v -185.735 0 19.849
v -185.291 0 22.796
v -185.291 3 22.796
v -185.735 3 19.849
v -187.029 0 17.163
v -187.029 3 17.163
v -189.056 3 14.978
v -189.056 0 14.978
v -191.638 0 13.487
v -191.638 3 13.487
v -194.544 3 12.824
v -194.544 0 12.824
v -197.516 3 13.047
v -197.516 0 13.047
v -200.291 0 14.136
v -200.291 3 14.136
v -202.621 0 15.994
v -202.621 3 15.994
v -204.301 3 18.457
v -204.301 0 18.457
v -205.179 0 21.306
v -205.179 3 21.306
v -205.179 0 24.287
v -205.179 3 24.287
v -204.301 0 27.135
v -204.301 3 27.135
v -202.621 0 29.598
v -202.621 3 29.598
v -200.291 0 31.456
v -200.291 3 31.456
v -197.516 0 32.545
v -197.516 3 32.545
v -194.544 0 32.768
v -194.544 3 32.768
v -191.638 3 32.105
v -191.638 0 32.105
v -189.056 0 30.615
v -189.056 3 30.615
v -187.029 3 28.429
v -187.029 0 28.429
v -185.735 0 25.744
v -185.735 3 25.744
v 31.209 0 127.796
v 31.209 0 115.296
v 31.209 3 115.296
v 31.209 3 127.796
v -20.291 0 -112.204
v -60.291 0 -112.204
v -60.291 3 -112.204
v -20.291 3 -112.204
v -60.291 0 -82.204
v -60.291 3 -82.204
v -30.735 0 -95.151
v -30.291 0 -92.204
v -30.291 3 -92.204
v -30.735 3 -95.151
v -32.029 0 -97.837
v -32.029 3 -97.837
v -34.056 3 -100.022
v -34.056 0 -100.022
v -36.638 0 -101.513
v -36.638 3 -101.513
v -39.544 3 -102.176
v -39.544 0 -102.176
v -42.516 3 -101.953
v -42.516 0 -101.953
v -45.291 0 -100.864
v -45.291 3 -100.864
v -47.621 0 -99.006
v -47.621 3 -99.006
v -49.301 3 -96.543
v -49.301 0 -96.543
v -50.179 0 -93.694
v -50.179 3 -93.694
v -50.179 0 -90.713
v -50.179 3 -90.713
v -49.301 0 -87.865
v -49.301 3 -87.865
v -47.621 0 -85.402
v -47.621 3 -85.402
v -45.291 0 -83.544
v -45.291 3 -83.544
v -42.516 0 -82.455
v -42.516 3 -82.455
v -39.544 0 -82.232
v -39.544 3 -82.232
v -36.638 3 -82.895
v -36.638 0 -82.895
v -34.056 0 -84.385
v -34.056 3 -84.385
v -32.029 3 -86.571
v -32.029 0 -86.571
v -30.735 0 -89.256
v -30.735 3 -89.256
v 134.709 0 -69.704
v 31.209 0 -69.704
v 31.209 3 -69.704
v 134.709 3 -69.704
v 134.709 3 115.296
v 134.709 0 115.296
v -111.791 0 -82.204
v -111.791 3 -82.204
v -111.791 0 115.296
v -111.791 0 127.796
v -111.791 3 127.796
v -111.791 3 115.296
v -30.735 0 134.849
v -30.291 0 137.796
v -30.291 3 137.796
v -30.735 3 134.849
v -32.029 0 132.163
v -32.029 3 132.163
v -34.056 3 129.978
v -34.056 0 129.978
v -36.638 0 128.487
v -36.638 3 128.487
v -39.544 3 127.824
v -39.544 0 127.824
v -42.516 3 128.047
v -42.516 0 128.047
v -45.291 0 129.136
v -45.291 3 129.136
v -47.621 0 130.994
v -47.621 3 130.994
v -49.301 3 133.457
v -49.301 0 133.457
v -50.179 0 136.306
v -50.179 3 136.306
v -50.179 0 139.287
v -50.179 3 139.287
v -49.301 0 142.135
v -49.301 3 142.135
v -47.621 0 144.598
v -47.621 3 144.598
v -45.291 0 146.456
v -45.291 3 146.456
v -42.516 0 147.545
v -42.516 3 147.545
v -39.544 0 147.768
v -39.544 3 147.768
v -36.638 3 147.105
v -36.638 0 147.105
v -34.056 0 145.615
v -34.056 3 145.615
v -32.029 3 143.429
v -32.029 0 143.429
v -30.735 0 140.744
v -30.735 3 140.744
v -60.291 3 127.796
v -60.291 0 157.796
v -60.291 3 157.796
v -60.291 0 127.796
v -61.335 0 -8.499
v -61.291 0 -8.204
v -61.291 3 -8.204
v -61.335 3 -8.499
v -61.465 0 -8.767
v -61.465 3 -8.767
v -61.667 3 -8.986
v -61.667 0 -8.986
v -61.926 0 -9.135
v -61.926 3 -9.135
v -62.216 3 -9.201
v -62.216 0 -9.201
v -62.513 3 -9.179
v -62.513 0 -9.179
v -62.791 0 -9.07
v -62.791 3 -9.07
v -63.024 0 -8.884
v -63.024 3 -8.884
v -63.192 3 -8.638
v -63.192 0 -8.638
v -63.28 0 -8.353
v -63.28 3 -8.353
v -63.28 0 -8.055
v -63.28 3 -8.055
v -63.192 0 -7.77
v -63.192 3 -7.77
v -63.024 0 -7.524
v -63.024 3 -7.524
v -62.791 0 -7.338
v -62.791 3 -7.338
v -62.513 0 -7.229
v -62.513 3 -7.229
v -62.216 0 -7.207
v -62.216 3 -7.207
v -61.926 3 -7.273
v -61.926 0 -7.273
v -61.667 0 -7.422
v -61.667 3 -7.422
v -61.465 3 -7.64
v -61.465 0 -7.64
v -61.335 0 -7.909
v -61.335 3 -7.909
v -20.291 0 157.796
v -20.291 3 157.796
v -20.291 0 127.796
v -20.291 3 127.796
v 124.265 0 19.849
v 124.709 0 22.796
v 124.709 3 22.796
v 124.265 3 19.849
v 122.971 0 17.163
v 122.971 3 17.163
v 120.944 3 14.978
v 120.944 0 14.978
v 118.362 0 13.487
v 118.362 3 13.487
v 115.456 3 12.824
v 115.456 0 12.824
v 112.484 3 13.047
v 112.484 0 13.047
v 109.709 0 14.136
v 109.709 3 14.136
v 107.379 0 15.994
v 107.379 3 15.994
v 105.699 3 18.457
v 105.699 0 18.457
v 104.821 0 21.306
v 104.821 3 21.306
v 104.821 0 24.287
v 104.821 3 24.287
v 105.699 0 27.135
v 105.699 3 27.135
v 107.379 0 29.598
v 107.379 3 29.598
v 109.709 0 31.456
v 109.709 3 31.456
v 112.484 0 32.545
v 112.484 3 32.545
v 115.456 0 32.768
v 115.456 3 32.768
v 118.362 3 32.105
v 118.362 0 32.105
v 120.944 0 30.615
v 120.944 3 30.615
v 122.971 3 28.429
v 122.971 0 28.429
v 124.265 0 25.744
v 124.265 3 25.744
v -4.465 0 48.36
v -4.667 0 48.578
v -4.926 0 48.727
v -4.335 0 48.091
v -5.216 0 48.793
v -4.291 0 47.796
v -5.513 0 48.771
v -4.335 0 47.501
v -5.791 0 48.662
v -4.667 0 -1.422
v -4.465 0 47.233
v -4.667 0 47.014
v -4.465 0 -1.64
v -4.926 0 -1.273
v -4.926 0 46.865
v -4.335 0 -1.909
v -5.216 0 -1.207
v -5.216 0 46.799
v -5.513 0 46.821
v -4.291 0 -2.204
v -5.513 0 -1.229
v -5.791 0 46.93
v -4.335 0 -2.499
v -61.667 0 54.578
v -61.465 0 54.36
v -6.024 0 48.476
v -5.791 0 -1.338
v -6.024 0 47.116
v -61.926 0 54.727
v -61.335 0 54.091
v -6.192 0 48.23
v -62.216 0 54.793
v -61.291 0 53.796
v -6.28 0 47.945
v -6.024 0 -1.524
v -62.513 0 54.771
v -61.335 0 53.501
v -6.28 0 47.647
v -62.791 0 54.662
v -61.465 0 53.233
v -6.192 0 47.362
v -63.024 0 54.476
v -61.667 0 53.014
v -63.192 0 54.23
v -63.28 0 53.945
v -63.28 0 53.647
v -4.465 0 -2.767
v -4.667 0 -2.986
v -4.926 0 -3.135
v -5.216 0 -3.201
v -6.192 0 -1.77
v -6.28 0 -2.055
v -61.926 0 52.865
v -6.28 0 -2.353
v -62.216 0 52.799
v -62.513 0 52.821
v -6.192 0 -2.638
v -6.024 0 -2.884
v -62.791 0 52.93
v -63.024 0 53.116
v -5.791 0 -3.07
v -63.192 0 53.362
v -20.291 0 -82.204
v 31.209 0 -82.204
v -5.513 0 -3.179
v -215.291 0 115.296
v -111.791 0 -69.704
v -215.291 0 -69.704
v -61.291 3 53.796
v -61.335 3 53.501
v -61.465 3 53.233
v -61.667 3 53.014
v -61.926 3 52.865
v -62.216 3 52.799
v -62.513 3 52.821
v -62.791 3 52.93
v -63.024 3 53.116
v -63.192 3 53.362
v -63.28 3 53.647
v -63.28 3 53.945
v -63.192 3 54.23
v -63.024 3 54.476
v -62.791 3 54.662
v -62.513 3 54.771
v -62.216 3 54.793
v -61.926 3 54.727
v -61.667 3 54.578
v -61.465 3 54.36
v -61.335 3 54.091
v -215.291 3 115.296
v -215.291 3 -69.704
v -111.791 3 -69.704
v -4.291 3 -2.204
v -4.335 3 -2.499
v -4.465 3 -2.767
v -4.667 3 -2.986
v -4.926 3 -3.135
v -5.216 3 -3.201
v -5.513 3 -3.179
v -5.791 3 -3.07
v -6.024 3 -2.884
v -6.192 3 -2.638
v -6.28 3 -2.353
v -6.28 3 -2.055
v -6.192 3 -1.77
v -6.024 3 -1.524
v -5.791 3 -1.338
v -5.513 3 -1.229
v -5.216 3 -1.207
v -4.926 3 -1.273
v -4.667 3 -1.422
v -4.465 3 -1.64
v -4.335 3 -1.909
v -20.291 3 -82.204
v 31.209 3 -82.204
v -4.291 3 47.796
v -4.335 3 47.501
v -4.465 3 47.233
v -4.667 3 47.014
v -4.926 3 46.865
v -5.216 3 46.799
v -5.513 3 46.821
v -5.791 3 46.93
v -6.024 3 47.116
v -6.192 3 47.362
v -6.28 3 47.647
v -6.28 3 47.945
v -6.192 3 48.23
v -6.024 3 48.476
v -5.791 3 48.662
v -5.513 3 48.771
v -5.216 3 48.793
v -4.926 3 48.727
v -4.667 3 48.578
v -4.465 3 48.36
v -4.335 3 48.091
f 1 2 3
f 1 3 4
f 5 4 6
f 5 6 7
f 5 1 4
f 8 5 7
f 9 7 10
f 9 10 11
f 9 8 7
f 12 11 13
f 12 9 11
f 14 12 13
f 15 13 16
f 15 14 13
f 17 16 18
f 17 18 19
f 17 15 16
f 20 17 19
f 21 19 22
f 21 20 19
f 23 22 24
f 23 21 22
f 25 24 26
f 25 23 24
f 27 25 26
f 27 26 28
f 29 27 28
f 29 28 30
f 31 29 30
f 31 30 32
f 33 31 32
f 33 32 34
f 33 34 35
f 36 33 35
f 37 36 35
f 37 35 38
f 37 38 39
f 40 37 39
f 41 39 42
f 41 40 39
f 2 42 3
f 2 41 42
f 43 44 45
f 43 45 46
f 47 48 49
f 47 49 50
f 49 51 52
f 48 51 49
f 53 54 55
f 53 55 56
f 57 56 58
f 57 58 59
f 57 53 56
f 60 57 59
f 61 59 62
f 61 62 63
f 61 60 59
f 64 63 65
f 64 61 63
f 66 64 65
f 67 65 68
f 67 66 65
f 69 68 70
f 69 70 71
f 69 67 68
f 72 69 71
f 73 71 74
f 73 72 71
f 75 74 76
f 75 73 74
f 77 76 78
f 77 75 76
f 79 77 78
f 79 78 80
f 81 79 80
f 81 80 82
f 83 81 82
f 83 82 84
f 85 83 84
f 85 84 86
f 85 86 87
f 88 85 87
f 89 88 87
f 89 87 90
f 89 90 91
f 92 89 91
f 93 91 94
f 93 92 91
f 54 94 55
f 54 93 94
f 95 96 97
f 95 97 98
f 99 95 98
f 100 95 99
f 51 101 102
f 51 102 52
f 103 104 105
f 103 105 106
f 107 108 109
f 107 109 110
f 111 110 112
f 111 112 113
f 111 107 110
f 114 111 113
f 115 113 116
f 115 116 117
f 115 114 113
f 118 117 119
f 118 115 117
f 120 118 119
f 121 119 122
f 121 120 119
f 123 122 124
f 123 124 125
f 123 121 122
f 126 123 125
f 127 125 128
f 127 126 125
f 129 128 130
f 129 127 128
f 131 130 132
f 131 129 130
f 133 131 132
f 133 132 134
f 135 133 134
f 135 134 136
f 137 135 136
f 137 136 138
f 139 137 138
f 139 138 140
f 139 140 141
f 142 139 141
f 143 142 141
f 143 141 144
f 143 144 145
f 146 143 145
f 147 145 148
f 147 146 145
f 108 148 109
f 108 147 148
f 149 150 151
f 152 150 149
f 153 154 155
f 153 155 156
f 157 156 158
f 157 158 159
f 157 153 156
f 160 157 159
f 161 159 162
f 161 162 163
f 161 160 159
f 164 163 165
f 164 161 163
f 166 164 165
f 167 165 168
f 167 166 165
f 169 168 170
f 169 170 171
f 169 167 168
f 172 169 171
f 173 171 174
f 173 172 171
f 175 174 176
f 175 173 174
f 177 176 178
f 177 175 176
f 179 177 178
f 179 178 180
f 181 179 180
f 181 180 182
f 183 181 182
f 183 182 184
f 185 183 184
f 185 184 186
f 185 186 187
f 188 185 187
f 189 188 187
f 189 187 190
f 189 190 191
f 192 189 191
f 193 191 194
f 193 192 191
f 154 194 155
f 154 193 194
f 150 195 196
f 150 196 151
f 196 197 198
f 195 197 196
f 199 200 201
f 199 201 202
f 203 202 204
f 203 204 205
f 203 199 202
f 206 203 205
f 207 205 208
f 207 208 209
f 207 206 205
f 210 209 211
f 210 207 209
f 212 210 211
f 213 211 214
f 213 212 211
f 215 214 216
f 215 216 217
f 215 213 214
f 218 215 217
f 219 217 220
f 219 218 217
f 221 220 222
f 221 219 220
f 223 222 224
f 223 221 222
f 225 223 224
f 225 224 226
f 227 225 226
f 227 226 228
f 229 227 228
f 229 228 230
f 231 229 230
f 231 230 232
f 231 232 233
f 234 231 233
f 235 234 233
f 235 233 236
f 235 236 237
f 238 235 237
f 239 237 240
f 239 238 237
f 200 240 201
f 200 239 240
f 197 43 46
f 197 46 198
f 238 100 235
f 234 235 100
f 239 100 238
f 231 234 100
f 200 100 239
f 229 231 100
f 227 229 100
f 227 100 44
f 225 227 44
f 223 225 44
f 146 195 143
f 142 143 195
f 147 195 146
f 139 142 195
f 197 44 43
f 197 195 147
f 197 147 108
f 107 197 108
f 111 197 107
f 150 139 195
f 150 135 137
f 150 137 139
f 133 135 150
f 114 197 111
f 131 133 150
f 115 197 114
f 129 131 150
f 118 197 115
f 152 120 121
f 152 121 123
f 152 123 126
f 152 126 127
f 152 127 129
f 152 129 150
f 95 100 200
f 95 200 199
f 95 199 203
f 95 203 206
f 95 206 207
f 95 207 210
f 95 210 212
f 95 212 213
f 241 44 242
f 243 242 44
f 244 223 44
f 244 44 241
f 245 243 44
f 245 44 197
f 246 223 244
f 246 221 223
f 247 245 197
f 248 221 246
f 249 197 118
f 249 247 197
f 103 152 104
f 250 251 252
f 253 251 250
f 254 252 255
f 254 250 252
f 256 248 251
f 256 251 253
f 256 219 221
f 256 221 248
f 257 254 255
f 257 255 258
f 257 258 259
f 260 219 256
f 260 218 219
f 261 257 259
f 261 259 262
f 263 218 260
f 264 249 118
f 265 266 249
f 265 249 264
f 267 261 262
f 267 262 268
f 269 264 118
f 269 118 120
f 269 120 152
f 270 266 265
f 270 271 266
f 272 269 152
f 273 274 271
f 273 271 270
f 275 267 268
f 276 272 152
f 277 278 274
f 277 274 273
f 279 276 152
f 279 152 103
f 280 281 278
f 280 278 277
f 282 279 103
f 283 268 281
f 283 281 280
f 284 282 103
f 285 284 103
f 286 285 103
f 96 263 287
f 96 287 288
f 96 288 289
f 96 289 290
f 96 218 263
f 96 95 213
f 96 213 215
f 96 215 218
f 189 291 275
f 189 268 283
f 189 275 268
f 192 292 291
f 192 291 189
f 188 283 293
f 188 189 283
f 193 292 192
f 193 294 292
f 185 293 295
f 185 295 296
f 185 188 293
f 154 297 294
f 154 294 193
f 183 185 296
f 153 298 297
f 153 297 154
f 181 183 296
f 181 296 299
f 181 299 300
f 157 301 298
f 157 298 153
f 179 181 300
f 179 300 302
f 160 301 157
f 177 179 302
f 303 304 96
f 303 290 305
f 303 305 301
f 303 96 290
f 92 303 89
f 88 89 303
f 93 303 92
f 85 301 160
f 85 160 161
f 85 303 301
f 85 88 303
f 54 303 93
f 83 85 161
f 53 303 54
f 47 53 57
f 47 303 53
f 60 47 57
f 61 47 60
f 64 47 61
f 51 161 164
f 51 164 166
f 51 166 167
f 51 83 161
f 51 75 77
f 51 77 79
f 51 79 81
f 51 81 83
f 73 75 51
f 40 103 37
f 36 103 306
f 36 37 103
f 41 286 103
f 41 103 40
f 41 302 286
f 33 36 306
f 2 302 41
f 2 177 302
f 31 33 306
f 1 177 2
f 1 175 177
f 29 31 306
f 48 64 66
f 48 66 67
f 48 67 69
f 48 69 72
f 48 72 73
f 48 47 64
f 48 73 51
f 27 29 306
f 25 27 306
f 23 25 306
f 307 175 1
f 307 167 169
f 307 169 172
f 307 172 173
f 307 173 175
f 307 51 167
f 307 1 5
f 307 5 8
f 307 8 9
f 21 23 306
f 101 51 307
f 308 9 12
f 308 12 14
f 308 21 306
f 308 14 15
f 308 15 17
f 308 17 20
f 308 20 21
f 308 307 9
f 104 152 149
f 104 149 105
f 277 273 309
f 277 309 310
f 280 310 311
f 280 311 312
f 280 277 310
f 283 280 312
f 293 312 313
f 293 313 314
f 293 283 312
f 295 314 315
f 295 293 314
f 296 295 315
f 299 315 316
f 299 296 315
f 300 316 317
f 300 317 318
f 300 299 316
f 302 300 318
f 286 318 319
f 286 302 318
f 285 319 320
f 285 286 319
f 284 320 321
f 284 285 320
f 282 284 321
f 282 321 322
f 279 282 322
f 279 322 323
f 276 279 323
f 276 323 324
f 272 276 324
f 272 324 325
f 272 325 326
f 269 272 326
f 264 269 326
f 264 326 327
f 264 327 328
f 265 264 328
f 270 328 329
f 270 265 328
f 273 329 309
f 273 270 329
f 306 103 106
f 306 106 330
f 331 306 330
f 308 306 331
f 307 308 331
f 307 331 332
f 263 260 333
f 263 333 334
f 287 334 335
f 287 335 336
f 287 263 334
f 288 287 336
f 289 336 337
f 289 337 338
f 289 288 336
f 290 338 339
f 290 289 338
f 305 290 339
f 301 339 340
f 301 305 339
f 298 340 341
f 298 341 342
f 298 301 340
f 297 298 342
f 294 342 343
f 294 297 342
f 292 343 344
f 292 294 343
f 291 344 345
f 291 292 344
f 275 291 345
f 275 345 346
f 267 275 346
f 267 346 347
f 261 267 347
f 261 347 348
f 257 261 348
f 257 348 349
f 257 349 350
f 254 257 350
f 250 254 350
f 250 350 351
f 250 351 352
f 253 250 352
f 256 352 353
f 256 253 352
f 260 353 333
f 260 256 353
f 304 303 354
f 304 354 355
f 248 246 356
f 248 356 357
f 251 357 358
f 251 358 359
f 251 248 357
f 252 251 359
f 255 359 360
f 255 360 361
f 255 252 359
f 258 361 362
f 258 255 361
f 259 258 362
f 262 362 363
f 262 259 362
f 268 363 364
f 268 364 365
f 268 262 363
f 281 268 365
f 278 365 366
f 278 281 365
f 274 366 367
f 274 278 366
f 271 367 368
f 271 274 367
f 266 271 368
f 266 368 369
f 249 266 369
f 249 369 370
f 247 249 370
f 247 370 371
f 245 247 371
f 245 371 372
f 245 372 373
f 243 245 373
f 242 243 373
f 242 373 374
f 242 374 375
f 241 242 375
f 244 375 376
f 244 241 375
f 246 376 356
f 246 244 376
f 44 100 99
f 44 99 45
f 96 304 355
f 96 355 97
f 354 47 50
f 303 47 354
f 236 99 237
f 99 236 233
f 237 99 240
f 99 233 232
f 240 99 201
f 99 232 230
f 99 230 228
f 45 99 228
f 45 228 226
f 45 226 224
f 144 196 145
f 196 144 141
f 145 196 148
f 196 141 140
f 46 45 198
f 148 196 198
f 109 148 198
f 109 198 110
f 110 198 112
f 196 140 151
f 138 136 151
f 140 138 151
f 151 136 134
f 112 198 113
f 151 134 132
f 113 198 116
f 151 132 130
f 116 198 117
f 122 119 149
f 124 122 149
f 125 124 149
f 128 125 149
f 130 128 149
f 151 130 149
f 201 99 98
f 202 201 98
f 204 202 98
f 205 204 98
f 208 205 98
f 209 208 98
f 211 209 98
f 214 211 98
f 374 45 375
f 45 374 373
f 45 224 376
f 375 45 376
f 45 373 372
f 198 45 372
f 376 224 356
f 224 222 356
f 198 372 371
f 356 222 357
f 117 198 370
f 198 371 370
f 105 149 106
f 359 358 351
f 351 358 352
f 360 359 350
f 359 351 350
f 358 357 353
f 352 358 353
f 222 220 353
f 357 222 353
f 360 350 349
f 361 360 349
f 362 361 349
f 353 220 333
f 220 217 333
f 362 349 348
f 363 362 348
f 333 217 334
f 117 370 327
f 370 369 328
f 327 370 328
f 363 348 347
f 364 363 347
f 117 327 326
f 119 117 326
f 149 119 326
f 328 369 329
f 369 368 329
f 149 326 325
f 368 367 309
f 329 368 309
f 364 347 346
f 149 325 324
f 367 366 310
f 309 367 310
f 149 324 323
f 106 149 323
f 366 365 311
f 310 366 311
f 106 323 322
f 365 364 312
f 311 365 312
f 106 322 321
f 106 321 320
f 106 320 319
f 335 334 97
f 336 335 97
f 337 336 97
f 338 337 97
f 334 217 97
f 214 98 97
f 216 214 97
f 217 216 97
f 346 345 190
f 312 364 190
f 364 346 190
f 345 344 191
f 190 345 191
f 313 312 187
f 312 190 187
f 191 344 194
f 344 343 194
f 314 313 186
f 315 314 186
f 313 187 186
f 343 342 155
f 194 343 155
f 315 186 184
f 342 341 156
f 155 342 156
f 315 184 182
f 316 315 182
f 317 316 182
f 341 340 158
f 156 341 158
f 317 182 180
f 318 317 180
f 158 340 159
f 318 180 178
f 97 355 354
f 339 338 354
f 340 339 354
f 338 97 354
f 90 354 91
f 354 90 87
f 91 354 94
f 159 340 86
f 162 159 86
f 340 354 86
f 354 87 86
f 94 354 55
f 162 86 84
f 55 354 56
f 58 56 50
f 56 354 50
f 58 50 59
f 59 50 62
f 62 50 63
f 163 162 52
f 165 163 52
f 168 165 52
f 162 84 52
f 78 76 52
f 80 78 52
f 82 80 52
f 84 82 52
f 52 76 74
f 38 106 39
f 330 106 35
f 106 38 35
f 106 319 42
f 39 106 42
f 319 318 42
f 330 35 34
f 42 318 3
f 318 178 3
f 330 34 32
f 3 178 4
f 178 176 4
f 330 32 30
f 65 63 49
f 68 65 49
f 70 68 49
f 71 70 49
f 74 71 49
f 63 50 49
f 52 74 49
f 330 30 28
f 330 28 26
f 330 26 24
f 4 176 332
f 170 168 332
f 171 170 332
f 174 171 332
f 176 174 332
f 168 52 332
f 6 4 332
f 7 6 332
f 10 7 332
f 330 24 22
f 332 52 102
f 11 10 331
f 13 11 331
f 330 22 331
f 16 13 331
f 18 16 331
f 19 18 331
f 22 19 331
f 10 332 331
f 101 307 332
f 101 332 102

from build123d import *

# Parameters (mm, degrees)
SKETCH1_R           = 1
SKETCH1_R_2         = 10
BOSS_EXTRUDE1_DEPTH = 3


with BuildPart() as part:
    # Sketch1 → Boss-Extrude1 (new body)
    with BuildSketch(Plane(origin=(0, 0, 0), x_dir=(1, 0, 0), z_dir=(0, 1, 0))):
        Polygon((-111.790938792, 69.703810947), (-111.790938792, 82.203810947), (-60.290938792, 82.203810947), (-60.290938792, 112.203810947), (-20.290938792, 112.203810947), (-20.290938792, 82.203810947), (31.209061208, 82.203810947), (31.209061208, 69.703810947), (134.709061208, 69.703810947), (134.709061208, -115.296189053), (31.209061208, -115.296189053), (31.209061208, -127.796189053), (-20.290938792, -127.796189053), (-20.290938792, -157.796189053), (-60.290938792, -157.796189053), (-60.290938792, -127.796189053), (-111.790938792, -127.796189053), (-111.790938792, -115.296189053), (-215.290938792, -115.296189053), (-215.290938792, 69.703810947), align=None)
        with Locations((-5.290938792, -47.796189053)):
            Circle(SKETCH1_R, mode=Mode.SUBTRACT)
        with Locations((-5.290938792, 2.203810947)):
            Circle(SKETCH1_R, mode=Mode.SUBTRACT)
        with Locations((-62.290938792, -53.796189053)):
            Circle(SKETCH1_R, mode=Mode.SUBTRACT)
        with Locations((-62.290938792, 8.203810947)):
            Circle(SKETCH1_R, mode=Mode.SUBTRACT)
        with Locations((-40.290938792, 92.203810947)):
            Circle(SKETCH1_R_2, mode=Mode.SUBTRACT)
        with Locations((-40.290938792, -137.796189053)):
            Circle(SKETCH1_R_2, mode=Mode.SUBTRACT)
        with Locations((114.709061208, -22.796189053)):
            Circle(SKETCH1_R_2, mode=Mode.SUBTRACT)
        with Locations((-195.290938792, -22.796189053)):
            Circle(SKETCH1_R_2, mode=Mode.SUBTRACT)
    extrude(amount=BOSS_EXTRUDE1_DEPTH)


solid = part.part
